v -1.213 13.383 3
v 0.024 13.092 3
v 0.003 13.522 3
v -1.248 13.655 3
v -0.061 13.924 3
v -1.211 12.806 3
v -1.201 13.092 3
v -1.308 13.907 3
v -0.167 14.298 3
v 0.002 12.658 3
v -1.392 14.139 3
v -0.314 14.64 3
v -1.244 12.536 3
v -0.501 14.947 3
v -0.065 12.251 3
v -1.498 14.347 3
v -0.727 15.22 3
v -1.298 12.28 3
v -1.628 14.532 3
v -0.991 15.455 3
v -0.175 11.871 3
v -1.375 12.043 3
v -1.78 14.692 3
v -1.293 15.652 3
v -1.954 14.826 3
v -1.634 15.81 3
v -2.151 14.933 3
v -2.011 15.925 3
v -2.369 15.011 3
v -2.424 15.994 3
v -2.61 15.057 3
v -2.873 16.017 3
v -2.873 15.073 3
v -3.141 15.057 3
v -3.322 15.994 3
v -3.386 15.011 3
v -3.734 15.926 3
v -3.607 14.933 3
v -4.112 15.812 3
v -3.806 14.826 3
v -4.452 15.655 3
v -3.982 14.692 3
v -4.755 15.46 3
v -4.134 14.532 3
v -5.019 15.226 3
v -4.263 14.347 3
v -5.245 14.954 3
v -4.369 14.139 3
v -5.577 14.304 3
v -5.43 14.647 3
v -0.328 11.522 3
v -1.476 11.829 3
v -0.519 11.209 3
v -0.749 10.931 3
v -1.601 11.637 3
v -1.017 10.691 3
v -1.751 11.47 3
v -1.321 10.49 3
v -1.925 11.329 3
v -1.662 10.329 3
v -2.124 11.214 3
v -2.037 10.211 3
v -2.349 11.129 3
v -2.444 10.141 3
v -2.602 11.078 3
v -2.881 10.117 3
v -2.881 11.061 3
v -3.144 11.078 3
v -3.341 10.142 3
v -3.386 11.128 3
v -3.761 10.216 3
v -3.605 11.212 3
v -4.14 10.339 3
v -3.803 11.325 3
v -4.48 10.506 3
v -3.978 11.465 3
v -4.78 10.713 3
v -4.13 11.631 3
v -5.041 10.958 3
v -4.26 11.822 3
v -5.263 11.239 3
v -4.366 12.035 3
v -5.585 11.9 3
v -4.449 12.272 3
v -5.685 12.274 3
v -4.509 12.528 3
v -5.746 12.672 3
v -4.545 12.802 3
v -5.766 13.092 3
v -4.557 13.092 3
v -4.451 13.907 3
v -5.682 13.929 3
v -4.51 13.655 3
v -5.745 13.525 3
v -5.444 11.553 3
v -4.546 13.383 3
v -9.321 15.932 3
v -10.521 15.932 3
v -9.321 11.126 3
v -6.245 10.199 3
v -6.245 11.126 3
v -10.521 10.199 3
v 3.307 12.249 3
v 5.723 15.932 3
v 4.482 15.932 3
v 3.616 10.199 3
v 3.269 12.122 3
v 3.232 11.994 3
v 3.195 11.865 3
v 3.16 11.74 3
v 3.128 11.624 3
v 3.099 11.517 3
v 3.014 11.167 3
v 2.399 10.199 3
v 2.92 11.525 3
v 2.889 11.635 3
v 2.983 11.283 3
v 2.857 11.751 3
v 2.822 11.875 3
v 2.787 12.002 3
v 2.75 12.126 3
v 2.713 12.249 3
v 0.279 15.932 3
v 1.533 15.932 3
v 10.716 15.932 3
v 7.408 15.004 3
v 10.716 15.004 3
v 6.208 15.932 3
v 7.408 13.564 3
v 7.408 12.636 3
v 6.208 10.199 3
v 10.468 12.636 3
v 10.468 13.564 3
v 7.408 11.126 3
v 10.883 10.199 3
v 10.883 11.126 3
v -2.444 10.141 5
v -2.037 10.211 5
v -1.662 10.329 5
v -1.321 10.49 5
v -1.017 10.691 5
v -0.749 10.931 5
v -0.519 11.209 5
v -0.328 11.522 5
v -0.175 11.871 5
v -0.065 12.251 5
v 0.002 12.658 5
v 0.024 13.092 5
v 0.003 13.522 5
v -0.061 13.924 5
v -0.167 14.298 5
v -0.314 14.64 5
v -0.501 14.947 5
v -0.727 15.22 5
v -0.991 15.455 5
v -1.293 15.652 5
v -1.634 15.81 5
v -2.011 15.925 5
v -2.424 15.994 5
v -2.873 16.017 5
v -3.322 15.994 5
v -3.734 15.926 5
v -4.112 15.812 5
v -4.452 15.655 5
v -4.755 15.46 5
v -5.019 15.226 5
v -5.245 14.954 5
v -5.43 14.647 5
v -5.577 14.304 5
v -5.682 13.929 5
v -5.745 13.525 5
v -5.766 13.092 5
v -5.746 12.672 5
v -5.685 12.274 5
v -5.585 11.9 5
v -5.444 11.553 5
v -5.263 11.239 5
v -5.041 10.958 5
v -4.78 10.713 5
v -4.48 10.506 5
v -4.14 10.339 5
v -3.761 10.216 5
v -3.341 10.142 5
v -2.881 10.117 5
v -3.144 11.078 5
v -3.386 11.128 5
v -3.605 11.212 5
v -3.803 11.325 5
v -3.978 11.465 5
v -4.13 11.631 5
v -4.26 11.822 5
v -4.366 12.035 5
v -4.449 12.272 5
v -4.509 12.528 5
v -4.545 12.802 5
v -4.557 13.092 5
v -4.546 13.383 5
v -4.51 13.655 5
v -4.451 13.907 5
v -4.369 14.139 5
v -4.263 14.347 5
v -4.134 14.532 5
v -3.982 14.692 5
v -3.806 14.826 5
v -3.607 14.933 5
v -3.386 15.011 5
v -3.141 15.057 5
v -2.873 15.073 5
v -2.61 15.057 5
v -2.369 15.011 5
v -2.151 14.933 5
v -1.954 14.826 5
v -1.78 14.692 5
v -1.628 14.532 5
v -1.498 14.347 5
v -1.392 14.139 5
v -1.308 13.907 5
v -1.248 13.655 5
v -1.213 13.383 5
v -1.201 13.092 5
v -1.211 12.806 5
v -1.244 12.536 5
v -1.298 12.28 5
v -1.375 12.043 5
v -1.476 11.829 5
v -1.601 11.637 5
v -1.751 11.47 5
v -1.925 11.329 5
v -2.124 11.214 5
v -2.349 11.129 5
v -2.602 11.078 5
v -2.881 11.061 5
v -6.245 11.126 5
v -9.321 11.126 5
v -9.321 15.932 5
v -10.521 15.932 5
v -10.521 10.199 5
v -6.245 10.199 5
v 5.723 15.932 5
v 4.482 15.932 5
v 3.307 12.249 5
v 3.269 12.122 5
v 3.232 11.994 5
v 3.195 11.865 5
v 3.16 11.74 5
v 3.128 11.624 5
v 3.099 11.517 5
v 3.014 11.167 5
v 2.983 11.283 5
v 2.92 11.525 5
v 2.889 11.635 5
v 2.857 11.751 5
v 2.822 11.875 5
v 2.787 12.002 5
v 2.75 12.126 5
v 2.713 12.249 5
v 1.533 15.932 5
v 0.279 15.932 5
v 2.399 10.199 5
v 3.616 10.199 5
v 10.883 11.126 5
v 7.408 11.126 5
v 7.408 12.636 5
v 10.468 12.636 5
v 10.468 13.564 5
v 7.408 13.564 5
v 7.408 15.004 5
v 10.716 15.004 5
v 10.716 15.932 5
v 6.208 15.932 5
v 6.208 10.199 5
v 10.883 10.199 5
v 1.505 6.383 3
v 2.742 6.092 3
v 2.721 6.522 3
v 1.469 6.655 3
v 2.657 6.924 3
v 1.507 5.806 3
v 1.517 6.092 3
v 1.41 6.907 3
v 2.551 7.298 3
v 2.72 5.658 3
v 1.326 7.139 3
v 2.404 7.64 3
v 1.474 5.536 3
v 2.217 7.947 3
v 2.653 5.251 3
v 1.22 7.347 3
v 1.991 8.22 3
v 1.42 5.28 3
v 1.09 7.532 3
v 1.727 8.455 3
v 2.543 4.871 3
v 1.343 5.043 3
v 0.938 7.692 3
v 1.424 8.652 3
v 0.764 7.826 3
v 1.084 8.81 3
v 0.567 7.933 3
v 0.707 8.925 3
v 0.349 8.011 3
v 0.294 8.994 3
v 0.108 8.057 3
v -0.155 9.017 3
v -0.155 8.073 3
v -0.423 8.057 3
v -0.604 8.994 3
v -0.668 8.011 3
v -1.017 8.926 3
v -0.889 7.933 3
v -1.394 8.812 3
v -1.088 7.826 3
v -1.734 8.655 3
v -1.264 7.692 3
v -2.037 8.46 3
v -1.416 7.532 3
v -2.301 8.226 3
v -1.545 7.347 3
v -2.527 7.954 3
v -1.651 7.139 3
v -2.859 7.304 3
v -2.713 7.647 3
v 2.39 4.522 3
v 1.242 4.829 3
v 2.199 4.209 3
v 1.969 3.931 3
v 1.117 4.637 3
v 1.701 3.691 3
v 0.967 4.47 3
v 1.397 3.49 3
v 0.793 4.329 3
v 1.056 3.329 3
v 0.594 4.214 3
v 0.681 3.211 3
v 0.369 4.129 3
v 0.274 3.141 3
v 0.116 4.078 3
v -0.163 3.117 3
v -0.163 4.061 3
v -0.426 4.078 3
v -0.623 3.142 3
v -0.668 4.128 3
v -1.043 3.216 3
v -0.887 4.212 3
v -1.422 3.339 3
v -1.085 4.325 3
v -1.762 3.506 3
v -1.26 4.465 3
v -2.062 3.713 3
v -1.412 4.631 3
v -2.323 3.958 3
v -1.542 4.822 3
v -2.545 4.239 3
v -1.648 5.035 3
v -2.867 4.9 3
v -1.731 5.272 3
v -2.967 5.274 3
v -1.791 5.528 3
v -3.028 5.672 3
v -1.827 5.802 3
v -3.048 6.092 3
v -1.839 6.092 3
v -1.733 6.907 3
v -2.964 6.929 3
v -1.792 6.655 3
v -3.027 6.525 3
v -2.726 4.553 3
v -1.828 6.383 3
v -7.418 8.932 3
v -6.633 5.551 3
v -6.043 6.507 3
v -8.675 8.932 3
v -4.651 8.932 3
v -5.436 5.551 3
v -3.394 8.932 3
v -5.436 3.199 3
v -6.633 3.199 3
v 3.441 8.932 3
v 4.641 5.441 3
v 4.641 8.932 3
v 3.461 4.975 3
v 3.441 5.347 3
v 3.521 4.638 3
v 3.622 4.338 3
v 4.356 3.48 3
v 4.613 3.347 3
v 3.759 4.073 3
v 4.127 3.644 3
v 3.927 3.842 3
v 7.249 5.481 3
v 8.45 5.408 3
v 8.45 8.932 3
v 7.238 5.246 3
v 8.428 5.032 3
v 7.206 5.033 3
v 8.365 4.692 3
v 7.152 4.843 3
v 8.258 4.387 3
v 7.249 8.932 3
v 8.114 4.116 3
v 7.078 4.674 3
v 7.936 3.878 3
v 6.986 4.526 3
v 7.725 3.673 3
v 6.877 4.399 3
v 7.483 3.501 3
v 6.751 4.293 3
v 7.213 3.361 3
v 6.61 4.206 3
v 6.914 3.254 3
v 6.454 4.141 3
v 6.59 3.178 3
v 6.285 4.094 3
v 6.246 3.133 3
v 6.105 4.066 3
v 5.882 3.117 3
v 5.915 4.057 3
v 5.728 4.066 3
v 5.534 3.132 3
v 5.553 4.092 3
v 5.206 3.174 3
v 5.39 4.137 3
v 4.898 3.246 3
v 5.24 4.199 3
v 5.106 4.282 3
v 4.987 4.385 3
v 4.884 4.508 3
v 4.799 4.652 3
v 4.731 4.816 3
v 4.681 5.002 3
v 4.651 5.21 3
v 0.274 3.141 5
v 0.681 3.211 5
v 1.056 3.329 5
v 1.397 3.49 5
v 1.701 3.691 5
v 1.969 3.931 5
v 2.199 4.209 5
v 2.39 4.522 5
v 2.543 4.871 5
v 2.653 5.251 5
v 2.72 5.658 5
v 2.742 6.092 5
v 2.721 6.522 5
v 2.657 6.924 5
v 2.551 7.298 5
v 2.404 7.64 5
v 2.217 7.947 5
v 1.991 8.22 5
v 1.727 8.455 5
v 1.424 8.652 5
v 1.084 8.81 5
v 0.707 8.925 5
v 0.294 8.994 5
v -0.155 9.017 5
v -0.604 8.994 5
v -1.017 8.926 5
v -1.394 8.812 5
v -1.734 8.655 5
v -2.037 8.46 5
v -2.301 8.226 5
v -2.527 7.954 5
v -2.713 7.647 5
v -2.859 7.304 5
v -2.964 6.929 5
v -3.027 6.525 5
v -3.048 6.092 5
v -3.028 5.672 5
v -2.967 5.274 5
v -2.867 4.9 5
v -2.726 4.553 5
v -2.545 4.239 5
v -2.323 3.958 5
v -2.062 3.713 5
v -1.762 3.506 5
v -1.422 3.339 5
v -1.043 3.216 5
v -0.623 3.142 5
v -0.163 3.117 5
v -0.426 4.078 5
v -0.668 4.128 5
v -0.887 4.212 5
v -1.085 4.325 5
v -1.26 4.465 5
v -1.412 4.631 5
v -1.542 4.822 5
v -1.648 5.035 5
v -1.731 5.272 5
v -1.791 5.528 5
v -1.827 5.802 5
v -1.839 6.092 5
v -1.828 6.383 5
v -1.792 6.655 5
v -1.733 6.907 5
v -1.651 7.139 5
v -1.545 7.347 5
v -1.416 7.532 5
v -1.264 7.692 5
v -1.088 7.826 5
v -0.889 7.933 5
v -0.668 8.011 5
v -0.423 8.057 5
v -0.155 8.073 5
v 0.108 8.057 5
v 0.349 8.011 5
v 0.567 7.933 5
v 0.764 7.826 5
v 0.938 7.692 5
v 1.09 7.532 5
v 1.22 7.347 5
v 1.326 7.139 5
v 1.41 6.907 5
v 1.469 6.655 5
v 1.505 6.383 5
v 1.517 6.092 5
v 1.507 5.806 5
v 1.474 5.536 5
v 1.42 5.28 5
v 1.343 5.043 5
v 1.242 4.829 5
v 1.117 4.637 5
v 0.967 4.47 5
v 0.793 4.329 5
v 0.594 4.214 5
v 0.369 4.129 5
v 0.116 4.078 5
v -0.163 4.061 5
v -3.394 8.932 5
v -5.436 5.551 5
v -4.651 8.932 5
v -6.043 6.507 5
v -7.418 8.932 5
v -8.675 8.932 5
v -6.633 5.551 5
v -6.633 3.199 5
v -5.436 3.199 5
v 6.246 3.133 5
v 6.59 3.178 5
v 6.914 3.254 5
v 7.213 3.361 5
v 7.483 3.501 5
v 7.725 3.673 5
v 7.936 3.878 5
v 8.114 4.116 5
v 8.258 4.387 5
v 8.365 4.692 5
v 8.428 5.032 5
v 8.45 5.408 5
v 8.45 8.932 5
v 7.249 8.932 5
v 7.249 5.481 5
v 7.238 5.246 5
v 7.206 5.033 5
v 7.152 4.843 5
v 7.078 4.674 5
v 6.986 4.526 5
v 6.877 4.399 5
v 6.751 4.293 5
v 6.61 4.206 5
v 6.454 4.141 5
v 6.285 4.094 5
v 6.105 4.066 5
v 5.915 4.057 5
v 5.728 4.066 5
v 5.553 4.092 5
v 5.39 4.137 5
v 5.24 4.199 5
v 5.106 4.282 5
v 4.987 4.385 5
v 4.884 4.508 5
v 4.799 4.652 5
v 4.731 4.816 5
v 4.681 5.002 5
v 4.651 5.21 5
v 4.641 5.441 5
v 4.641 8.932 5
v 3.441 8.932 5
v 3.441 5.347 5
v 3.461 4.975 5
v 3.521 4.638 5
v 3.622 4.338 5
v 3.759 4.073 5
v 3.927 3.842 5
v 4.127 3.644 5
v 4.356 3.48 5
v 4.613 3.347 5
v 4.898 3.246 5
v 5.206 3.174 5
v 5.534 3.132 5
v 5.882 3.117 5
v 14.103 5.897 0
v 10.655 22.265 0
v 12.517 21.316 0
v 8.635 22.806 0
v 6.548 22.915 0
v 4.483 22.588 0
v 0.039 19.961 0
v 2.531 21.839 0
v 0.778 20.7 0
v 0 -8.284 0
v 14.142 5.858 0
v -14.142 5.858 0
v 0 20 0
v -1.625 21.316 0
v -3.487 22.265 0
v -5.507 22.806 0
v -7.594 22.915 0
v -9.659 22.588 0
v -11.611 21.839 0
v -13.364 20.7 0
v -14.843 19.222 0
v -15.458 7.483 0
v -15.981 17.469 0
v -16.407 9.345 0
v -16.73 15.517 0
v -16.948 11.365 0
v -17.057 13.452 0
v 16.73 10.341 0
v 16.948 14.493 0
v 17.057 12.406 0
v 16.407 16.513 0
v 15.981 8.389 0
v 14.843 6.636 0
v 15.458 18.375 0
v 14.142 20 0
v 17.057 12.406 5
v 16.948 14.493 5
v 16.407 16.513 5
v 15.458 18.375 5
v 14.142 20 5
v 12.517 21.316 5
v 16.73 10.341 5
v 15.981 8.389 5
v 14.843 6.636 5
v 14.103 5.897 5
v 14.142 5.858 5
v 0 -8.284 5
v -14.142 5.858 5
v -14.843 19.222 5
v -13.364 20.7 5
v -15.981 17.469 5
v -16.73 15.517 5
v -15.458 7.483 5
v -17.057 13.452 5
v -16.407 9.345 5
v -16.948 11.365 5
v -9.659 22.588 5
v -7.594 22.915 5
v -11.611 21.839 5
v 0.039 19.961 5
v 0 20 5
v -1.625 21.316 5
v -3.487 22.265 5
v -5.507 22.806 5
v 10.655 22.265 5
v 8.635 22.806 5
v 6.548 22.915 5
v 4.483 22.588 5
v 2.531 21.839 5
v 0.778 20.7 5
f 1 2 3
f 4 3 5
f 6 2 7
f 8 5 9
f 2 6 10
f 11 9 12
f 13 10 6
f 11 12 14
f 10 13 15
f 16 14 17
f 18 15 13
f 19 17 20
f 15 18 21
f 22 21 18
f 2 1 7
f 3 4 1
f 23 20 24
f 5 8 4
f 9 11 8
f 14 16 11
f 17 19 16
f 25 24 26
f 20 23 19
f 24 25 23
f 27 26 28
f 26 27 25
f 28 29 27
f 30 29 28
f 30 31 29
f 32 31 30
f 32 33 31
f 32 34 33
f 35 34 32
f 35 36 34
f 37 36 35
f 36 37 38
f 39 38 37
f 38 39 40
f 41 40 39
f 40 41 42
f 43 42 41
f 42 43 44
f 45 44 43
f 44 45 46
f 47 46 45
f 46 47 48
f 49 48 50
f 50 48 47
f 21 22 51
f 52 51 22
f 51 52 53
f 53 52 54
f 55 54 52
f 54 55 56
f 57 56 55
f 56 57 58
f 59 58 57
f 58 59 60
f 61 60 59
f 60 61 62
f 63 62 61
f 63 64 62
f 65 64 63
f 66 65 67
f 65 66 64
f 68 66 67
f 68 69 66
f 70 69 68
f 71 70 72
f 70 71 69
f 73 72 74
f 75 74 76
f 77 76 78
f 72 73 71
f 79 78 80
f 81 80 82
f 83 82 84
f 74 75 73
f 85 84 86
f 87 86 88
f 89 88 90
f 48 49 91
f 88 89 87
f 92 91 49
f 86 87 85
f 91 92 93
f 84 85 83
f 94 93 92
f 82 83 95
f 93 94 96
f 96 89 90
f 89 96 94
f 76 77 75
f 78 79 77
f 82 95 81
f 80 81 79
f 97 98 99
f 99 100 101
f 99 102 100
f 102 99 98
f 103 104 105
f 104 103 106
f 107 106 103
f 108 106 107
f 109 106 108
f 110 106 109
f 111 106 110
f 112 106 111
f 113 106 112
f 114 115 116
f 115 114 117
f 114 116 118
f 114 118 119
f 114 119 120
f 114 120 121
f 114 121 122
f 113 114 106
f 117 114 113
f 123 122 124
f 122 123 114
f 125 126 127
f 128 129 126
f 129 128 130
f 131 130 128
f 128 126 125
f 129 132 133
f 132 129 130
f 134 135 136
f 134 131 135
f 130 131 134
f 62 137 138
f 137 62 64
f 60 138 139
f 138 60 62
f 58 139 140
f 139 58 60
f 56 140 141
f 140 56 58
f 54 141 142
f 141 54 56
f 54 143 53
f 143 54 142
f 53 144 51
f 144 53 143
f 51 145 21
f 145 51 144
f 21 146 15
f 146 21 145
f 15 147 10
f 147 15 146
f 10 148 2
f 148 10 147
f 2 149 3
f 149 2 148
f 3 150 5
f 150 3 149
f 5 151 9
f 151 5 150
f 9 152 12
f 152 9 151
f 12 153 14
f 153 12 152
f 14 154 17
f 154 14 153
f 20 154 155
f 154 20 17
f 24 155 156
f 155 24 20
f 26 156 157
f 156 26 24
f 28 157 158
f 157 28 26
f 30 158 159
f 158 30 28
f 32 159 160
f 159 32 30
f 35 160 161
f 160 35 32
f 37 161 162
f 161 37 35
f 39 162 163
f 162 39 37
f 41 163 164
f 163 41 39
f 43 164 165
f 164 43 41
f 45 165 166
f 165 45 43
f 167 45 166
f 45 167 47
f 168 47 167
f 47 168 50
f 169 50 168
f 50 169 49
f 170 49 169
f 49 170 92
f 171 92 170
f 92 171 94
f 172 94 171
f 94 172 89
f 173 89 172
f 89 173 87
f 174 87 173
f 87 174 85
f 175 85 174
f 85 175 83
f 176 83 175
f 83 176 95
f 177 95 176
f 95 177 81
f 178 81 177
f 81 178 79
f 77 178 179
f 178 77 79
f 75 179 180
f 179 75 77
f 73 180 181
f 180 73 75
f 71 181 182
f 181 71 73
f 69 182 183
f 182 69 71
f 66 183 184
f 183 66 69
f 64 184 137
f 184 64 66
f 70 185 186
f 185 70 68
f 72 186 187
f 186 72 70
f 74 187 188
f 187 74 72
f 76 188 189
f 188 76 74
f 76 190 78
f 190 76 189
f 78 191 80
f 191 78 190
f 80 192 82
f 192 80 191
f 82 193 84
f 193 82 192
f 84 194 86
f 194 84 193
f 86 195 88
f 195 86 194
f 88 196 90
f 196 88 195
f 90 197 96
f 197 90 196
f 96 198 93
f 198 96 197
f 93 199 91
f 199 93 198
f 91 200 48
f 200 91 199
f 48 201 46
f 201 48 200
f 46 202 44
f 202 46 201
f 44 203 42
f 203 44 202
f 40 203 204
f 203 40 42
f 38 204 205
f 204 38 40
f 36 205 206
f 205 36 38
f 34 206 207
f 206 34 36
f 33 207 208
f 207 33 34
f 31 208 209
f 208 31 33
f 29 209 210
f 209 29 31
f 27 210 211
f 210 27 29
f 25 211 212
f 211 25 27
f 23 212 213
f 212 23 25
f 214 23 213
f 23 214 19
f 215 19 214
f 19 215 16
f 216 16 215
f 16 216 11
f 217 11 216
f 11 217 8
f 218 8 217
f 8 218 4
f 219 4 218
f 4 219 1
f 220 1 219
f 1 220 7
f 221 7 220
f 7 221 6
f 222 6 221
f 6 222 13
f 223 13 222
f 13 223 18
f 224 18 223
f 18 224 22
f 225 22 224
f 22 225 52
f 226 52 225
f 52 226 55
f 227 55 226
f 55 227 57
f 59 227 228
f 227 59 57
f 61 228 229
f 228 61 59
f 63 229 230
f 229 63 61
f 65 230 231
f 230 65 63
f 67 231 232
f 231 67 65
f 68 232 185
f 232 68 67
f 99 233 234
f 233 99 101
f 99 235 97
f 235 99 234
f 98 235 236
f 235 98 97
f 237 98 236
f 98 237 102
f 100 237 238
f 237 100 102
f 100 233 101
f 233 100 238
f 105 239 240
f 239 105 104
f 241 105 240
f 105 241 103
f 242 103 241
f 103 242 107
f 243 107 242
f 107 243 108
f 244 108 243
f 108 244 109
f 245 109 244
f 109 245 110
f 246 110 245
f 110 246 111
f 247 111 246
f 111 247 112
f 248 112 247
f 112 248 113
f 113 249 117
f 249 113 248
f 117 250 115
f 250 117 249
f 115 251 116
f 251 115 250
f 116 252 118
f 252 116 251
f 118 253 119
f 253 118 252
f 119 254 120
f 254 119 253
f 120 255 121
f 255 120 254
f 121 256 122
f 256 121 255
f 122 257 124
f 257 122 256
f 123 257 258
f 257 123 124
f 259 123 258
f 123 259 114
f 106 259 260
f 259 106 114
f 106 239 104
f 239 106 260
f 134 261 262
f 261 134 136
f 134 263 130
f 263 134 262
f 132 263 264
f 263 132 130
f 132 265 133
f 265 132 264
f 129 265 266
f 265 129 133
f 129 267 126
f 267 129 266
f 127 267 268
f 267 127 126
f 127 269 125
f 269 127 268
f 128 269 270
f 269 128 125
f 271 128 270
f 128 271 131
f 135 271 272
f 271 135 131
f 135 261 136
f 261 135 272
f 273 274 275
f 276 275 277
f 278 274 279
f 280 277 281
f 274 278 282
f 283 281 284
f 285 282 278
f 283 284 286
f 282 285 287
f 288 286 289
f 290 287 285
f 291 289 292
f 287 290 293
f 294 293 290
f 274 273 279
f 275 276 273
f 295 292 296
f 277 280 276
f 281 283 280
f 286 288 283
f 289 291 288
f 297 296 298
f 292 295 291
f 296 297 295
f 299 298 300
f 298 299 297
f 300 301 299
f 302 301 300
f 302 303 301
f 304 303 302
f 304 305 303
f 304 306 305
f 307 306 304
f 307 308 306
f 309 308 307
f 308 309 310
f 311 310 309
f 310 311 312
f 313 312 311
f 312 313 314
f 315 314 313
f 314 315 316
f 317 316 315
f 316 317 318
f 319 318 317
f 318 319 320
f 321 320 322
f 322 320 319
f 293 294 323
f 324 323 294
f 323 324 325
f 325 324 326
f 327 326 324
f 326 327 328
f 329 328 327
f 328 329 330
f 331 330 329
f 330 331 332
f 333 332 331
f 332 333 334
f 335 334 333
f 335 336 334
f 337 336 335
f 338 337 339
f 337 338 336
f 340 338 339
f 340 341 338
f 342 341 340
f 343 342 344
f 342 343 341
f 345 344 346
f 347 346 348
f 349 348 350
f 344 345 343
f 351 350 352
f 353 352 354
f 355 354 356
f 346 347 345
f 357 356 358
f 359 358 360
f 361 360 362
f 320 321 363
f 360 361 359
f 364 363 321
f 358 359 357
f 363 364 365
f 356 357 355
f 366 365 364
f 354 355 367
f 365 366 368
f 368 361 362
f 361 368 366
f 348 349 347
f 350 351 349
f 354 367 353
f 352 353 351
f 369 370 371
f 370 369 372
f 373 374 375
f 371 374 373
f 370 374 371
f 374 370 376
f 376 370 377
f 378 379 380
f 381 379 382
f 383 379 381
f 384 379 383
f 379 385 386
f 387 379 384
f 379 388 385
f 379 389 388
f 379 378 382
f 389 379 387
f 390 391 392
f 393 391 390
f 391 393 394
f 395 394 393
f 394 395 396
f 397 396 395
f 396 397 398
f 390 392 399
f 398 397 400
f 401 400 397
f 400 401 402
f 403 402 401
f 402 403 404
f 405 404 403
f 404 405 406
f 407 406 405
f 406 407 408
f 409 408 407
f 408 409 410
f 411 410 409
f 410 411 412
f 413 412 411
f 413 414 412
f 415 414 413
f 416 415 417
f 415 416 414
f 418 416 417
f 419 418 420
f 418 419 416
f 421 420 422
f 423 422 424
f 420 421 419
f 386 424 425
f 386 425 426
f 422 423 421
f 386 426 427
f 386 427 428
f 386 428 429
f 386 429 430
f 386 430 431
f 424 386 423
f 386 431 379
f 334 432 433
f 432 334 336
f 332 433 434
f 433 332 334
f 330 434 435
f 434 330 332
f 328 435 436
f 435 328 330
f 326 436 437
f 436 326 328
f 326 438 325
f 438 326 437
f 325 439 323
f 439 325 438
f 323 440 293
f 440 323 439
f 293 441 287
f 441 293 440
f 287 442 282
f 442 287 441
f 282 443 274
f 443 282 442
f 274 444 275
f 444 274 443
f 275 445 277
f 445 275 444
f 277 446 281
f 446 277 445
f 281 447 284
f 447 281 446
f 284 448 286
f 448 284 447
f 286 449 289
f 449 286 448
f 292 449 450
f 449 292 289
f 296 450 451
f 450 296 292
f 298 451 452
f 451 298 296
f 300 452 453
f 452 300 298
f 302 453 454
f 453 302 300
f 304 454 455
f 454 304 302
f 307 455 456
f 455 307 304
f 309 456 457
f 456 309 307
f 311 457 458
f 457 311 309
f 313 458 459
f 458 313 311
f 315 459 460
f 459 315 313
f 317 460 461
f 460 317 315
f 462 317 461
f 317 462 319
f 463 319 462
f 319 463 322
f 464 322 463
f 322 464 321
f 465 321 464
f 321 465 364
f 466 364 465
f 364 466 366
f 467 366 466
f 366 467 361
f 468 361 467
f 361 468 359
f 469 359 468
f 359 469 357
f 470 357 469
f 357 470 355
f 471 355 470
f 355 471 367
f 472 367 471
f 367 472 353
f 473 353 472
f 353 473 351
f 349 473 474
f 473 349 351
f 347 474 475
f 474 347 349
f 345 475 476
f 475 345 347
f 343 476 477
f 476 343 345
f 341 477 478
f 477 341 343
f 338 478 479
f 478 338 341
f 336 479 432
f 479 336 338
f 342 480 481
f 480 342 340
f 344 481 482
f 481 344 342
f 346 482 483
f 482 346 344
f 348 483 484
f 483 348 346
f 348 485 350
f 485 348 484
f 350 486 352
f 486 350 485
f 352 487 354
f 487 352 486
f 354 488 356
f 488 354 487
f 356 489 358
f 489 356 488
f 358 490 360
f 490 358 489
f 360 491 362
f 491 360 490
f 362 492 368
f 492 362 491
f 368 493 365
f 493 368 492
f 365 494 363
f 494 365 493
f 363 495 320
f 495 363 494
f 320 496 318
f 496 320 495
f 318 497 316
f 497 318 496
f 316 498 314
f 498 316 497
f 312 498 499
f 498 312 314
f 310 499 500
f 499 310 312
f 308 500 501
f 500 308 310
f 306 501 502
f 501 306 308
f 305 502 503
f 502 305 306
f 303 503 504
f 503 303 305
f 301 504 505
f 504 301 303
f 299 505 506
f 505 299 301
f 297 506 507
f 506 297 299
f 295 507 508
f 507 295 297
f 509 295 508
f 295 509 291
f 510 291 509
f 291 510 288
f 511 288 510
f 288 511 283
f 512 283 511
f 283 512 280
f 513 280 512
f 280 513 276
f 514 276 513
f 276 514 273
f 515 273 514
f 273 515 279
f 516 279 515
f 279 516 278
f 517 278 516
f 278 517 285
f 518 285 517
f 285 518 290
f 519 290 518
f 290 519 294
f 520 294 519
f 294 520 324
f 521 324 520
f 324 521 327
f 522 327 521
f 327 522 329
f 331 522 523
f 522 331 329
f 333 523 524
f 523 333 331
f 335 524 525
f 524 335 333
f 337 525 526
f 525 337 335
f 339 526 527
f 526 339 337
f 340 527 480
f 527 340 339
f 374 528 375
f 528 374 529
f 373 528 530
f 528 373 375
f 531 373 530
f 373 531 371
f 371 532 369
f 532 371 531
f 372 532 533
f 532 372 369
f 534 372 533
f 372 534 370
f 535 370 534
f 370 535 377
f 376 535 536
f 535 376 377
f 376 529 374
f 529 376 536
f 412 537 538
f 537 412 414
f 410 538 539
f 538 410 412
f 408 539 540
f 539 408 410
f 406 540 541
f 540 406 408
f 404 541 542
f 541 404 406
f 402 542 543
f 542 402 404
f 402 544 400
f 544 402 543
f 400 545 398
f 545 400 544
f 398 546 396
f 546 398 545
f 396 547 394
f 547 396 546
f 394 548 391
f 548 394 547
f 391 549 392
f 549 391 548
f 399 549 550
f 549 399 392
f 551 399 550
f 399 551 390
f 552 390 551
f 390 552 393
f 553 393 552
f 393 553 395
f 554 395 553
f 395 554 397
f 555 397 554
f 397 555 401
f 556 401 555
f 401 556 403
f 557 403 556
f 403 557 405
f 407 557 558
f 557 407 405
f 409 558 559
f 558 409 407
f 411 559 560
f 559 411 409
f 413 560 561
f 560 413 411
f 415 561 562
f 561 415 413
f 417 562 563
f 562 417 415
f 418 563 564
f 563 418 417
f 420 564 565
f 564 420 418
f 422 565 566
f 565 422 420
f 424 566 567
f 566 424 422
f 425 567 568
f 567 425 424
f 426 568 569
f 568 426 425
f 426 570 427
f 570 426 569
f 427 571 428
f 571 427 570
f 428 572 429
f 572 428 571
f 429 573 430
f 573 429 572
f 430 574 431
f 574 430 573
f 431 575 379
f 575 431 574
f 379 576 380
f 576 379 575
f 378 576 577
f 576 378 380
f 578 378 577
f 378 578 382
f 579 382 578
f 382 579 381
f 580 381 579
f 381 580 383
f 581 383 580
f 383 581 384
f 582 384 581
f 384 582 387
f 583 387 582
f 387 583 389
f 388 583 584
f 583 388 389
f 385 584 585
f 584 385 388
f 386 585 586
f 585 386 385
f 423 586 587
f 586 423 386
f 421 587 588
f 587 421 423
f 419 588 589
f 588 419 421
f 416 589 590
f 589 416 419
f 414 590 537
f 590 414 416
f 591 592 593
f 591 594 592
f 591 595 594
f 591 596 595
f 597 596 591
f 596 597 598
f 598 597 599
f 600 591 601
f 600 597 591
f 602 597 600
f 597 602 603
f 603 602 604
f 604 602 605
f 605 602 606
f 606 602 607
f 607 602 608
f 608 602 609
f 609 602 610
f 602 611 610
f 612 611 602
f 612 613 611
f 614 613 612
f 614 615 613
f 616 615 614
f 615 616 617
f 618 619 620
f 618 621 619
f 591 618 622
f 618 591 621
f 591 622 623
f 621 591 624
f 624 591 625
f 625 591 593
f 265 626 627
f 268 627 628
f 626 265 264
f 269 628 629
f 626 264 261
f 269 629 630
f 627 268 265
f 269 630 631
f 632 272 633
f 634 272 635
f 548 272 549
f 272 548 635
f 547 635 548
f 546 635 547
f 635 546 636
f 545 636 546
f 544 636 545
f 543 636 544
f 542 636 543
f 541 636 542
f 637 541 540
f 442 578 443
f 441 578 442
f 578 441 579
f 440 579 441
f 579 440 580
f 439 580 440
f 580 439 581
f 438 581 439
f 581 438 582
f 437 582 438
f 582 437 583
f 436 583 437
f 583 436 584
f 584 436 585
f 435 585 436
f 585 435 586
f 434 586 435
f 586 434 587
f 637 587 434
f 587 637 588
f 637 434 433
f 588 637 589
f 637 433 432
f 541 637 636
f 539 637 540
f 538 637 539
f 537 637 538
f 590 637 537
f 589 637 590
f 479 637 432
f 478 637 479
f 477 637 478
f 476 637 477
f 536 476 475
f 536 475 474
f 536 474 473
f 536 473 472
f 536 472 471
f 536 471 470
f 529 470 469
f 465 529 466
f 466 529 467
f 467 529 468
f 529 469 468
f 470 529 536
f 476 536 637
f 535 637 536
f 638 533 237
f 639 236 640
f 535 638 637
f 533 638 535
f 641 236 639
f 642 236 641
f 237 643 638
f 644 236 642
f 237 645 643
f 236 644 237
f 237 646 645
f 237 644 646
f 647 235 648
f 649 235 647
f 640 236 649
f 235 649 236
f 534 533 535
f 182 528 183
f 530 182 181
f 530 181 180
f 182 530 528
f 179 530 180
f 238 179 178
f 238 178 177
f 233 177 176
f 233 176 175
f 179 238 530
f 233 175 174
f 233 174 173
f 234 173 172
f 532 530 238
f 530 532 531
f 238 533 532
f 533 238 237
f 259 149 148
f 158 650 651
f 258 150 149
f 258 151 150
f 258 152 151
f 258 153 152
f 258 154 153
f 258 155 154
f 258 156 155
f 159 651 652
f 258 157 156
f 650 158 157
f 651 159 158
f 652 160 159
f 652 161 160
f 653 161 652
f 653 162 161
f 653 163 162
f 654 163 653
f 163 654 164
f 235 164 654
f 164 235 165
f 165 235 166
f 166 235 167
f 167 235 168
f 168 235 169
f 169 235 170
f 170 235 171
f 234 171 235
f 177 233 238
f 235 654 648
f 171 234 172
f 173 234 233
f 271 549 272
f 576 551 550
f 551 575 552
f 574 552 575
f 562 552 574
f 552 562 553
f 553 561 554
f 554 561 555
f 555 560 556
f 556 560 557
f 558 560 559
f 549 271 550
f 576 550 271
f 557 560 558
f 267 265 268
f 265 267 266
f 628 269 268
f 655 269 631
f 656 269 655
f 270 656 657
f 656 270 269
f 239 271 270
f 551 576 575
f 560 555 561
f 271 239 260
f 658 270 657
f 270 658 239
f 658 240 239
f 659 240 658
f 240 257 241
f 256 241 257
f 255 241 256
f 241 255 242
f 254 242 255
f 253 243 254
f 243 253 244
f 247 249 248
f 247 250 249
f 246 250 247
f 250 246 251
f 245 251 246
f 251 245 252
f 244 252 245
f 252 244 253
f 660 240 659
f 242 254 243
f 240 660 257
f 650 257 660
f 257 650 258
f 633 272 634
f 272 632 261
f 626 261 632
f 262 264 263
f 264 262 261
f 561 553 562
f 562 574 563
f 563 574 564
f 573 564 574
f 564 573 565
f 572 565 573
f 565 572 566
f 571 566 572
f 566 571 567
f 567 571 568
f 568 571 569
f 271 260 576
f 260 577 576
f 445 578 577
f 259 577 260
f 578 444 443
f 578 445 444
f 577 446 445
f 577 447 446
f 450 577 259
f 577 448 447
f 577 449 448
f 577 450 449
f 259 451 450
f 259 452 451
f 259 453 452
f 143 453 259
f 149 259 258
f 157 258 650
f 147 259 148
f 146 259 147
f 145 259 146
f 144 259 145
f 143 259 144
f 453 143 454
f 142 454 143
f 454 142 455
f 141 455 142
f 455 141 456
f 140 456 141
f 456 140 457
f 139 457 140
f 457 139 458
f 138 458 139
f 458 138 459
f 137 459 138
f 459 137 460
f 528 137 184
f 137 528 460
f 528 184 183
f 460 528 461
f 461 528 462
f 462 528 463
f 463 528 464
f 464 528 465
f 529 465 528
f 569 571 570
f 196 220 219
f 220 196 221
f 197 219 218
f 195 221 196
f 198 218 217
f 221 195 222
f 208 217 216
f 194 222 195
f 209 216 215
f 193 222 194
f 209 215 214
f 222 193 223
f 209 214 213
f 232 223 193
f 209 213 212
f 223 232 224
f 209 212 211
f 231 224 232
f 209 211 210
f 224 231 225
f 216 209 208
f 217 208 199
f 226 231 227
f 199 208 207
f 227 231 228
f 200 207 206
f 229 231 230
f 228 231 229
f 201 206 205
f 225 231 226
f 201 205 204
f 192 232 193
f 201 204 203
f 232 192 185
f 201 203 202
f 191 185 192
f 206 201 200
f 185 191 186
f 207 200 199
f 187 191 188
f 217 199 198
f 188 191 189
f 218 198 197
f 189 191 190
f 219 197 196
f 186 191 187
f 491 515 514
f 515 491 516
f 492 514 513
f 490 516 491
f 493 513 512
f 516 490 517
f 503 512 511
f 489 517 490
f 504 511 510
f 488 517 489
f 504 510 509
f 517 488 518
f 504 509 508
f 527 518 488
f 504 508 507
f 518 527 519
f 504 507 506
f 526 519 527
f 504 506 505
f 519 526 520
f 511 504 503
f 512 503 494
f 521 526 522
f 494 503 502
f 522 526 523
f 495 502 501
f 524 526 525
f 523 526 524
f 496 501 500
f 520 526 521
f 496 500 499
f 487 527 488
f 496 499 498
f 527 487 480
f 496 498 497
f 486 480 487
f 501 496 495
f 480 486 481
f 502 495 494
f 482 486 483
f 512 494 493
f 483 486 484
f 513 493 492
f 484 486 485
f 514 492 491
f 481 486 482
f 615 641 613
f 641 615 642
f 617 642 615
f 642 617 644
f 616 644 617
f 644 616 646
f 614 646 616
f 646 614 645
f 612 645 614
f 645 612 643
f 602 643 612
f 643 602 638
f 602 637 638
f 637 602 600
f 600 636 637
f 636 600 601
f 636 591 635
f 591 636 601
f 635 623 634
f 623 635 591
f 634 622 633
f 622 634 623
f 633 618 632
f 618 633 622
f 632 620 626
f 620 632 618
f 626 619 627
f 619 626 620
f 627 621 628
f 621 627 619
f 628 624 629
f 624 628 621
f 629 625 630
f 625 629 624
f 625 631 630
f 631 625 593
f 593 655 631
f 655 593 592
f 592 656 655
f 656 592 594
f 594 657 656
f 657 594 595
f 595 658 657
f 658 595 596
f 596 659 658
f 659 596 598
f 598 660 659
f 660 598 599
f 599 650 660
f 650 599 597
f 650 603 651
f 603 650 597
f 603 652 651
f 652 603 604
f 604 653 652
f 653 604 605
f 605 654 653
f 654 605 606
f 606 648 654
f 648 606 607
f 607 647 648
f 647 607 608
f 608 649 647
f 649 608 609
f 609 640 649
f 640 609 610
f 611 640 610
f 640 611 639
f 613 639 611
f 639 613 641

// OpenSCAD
// 
// Customizable Heart
// version 1.0   2/13/2016
// by DaoZenCiaoYen @ Thingiverse
//

// preview[view:south, tilt:top]

/* [Main] */
text_line_1 = "LOVE" ;
text_line_2 = "YOU" ;
text_line_3 = "" ;
show_lines = 2 ; // [1:3]
heart_size = 1 ; // [0.5:0.1:2]
adjust_y = 0 ; // [-5:0.5:5]


color("Red",1) render(3) main() ;

module main() 
{
  difference()
  {
    scale([heart_size,heart_size,1]) heart();
    translate([0,adjust_y,0]) words();
  }
}

module heart()
{
  linear_extrude(5)
  translate([0,20,0])
  rotate([0,0,180+45])
  {
    translate([0,10,0]) circle(10);
    translate([10,0,0]) circle(10);
    square(20);
  }
}

module words()
{
  if (show_lines==1)
  {
    word(text_line_1,0,11*heart_size);
  }
  else
  {
    if (show_lines==2)
    {
      word(text_line_1,0,13*heart_size);
      word(text_line_2,0,6*heart_size);
    }
    else
    {
      word(text_line_1,0,16*heart_size);
      word(text_line_2,0,11*heart_size);
      word(text_line_3,0,6*heart_size);
    }
  }
}

module word(t,x,y)
{
  translate([x,y,3]) linear_extrude(3) 
    text(t,6,font = "Liberation Sans:style=Bold",
      halign="center",valign="center");
}
